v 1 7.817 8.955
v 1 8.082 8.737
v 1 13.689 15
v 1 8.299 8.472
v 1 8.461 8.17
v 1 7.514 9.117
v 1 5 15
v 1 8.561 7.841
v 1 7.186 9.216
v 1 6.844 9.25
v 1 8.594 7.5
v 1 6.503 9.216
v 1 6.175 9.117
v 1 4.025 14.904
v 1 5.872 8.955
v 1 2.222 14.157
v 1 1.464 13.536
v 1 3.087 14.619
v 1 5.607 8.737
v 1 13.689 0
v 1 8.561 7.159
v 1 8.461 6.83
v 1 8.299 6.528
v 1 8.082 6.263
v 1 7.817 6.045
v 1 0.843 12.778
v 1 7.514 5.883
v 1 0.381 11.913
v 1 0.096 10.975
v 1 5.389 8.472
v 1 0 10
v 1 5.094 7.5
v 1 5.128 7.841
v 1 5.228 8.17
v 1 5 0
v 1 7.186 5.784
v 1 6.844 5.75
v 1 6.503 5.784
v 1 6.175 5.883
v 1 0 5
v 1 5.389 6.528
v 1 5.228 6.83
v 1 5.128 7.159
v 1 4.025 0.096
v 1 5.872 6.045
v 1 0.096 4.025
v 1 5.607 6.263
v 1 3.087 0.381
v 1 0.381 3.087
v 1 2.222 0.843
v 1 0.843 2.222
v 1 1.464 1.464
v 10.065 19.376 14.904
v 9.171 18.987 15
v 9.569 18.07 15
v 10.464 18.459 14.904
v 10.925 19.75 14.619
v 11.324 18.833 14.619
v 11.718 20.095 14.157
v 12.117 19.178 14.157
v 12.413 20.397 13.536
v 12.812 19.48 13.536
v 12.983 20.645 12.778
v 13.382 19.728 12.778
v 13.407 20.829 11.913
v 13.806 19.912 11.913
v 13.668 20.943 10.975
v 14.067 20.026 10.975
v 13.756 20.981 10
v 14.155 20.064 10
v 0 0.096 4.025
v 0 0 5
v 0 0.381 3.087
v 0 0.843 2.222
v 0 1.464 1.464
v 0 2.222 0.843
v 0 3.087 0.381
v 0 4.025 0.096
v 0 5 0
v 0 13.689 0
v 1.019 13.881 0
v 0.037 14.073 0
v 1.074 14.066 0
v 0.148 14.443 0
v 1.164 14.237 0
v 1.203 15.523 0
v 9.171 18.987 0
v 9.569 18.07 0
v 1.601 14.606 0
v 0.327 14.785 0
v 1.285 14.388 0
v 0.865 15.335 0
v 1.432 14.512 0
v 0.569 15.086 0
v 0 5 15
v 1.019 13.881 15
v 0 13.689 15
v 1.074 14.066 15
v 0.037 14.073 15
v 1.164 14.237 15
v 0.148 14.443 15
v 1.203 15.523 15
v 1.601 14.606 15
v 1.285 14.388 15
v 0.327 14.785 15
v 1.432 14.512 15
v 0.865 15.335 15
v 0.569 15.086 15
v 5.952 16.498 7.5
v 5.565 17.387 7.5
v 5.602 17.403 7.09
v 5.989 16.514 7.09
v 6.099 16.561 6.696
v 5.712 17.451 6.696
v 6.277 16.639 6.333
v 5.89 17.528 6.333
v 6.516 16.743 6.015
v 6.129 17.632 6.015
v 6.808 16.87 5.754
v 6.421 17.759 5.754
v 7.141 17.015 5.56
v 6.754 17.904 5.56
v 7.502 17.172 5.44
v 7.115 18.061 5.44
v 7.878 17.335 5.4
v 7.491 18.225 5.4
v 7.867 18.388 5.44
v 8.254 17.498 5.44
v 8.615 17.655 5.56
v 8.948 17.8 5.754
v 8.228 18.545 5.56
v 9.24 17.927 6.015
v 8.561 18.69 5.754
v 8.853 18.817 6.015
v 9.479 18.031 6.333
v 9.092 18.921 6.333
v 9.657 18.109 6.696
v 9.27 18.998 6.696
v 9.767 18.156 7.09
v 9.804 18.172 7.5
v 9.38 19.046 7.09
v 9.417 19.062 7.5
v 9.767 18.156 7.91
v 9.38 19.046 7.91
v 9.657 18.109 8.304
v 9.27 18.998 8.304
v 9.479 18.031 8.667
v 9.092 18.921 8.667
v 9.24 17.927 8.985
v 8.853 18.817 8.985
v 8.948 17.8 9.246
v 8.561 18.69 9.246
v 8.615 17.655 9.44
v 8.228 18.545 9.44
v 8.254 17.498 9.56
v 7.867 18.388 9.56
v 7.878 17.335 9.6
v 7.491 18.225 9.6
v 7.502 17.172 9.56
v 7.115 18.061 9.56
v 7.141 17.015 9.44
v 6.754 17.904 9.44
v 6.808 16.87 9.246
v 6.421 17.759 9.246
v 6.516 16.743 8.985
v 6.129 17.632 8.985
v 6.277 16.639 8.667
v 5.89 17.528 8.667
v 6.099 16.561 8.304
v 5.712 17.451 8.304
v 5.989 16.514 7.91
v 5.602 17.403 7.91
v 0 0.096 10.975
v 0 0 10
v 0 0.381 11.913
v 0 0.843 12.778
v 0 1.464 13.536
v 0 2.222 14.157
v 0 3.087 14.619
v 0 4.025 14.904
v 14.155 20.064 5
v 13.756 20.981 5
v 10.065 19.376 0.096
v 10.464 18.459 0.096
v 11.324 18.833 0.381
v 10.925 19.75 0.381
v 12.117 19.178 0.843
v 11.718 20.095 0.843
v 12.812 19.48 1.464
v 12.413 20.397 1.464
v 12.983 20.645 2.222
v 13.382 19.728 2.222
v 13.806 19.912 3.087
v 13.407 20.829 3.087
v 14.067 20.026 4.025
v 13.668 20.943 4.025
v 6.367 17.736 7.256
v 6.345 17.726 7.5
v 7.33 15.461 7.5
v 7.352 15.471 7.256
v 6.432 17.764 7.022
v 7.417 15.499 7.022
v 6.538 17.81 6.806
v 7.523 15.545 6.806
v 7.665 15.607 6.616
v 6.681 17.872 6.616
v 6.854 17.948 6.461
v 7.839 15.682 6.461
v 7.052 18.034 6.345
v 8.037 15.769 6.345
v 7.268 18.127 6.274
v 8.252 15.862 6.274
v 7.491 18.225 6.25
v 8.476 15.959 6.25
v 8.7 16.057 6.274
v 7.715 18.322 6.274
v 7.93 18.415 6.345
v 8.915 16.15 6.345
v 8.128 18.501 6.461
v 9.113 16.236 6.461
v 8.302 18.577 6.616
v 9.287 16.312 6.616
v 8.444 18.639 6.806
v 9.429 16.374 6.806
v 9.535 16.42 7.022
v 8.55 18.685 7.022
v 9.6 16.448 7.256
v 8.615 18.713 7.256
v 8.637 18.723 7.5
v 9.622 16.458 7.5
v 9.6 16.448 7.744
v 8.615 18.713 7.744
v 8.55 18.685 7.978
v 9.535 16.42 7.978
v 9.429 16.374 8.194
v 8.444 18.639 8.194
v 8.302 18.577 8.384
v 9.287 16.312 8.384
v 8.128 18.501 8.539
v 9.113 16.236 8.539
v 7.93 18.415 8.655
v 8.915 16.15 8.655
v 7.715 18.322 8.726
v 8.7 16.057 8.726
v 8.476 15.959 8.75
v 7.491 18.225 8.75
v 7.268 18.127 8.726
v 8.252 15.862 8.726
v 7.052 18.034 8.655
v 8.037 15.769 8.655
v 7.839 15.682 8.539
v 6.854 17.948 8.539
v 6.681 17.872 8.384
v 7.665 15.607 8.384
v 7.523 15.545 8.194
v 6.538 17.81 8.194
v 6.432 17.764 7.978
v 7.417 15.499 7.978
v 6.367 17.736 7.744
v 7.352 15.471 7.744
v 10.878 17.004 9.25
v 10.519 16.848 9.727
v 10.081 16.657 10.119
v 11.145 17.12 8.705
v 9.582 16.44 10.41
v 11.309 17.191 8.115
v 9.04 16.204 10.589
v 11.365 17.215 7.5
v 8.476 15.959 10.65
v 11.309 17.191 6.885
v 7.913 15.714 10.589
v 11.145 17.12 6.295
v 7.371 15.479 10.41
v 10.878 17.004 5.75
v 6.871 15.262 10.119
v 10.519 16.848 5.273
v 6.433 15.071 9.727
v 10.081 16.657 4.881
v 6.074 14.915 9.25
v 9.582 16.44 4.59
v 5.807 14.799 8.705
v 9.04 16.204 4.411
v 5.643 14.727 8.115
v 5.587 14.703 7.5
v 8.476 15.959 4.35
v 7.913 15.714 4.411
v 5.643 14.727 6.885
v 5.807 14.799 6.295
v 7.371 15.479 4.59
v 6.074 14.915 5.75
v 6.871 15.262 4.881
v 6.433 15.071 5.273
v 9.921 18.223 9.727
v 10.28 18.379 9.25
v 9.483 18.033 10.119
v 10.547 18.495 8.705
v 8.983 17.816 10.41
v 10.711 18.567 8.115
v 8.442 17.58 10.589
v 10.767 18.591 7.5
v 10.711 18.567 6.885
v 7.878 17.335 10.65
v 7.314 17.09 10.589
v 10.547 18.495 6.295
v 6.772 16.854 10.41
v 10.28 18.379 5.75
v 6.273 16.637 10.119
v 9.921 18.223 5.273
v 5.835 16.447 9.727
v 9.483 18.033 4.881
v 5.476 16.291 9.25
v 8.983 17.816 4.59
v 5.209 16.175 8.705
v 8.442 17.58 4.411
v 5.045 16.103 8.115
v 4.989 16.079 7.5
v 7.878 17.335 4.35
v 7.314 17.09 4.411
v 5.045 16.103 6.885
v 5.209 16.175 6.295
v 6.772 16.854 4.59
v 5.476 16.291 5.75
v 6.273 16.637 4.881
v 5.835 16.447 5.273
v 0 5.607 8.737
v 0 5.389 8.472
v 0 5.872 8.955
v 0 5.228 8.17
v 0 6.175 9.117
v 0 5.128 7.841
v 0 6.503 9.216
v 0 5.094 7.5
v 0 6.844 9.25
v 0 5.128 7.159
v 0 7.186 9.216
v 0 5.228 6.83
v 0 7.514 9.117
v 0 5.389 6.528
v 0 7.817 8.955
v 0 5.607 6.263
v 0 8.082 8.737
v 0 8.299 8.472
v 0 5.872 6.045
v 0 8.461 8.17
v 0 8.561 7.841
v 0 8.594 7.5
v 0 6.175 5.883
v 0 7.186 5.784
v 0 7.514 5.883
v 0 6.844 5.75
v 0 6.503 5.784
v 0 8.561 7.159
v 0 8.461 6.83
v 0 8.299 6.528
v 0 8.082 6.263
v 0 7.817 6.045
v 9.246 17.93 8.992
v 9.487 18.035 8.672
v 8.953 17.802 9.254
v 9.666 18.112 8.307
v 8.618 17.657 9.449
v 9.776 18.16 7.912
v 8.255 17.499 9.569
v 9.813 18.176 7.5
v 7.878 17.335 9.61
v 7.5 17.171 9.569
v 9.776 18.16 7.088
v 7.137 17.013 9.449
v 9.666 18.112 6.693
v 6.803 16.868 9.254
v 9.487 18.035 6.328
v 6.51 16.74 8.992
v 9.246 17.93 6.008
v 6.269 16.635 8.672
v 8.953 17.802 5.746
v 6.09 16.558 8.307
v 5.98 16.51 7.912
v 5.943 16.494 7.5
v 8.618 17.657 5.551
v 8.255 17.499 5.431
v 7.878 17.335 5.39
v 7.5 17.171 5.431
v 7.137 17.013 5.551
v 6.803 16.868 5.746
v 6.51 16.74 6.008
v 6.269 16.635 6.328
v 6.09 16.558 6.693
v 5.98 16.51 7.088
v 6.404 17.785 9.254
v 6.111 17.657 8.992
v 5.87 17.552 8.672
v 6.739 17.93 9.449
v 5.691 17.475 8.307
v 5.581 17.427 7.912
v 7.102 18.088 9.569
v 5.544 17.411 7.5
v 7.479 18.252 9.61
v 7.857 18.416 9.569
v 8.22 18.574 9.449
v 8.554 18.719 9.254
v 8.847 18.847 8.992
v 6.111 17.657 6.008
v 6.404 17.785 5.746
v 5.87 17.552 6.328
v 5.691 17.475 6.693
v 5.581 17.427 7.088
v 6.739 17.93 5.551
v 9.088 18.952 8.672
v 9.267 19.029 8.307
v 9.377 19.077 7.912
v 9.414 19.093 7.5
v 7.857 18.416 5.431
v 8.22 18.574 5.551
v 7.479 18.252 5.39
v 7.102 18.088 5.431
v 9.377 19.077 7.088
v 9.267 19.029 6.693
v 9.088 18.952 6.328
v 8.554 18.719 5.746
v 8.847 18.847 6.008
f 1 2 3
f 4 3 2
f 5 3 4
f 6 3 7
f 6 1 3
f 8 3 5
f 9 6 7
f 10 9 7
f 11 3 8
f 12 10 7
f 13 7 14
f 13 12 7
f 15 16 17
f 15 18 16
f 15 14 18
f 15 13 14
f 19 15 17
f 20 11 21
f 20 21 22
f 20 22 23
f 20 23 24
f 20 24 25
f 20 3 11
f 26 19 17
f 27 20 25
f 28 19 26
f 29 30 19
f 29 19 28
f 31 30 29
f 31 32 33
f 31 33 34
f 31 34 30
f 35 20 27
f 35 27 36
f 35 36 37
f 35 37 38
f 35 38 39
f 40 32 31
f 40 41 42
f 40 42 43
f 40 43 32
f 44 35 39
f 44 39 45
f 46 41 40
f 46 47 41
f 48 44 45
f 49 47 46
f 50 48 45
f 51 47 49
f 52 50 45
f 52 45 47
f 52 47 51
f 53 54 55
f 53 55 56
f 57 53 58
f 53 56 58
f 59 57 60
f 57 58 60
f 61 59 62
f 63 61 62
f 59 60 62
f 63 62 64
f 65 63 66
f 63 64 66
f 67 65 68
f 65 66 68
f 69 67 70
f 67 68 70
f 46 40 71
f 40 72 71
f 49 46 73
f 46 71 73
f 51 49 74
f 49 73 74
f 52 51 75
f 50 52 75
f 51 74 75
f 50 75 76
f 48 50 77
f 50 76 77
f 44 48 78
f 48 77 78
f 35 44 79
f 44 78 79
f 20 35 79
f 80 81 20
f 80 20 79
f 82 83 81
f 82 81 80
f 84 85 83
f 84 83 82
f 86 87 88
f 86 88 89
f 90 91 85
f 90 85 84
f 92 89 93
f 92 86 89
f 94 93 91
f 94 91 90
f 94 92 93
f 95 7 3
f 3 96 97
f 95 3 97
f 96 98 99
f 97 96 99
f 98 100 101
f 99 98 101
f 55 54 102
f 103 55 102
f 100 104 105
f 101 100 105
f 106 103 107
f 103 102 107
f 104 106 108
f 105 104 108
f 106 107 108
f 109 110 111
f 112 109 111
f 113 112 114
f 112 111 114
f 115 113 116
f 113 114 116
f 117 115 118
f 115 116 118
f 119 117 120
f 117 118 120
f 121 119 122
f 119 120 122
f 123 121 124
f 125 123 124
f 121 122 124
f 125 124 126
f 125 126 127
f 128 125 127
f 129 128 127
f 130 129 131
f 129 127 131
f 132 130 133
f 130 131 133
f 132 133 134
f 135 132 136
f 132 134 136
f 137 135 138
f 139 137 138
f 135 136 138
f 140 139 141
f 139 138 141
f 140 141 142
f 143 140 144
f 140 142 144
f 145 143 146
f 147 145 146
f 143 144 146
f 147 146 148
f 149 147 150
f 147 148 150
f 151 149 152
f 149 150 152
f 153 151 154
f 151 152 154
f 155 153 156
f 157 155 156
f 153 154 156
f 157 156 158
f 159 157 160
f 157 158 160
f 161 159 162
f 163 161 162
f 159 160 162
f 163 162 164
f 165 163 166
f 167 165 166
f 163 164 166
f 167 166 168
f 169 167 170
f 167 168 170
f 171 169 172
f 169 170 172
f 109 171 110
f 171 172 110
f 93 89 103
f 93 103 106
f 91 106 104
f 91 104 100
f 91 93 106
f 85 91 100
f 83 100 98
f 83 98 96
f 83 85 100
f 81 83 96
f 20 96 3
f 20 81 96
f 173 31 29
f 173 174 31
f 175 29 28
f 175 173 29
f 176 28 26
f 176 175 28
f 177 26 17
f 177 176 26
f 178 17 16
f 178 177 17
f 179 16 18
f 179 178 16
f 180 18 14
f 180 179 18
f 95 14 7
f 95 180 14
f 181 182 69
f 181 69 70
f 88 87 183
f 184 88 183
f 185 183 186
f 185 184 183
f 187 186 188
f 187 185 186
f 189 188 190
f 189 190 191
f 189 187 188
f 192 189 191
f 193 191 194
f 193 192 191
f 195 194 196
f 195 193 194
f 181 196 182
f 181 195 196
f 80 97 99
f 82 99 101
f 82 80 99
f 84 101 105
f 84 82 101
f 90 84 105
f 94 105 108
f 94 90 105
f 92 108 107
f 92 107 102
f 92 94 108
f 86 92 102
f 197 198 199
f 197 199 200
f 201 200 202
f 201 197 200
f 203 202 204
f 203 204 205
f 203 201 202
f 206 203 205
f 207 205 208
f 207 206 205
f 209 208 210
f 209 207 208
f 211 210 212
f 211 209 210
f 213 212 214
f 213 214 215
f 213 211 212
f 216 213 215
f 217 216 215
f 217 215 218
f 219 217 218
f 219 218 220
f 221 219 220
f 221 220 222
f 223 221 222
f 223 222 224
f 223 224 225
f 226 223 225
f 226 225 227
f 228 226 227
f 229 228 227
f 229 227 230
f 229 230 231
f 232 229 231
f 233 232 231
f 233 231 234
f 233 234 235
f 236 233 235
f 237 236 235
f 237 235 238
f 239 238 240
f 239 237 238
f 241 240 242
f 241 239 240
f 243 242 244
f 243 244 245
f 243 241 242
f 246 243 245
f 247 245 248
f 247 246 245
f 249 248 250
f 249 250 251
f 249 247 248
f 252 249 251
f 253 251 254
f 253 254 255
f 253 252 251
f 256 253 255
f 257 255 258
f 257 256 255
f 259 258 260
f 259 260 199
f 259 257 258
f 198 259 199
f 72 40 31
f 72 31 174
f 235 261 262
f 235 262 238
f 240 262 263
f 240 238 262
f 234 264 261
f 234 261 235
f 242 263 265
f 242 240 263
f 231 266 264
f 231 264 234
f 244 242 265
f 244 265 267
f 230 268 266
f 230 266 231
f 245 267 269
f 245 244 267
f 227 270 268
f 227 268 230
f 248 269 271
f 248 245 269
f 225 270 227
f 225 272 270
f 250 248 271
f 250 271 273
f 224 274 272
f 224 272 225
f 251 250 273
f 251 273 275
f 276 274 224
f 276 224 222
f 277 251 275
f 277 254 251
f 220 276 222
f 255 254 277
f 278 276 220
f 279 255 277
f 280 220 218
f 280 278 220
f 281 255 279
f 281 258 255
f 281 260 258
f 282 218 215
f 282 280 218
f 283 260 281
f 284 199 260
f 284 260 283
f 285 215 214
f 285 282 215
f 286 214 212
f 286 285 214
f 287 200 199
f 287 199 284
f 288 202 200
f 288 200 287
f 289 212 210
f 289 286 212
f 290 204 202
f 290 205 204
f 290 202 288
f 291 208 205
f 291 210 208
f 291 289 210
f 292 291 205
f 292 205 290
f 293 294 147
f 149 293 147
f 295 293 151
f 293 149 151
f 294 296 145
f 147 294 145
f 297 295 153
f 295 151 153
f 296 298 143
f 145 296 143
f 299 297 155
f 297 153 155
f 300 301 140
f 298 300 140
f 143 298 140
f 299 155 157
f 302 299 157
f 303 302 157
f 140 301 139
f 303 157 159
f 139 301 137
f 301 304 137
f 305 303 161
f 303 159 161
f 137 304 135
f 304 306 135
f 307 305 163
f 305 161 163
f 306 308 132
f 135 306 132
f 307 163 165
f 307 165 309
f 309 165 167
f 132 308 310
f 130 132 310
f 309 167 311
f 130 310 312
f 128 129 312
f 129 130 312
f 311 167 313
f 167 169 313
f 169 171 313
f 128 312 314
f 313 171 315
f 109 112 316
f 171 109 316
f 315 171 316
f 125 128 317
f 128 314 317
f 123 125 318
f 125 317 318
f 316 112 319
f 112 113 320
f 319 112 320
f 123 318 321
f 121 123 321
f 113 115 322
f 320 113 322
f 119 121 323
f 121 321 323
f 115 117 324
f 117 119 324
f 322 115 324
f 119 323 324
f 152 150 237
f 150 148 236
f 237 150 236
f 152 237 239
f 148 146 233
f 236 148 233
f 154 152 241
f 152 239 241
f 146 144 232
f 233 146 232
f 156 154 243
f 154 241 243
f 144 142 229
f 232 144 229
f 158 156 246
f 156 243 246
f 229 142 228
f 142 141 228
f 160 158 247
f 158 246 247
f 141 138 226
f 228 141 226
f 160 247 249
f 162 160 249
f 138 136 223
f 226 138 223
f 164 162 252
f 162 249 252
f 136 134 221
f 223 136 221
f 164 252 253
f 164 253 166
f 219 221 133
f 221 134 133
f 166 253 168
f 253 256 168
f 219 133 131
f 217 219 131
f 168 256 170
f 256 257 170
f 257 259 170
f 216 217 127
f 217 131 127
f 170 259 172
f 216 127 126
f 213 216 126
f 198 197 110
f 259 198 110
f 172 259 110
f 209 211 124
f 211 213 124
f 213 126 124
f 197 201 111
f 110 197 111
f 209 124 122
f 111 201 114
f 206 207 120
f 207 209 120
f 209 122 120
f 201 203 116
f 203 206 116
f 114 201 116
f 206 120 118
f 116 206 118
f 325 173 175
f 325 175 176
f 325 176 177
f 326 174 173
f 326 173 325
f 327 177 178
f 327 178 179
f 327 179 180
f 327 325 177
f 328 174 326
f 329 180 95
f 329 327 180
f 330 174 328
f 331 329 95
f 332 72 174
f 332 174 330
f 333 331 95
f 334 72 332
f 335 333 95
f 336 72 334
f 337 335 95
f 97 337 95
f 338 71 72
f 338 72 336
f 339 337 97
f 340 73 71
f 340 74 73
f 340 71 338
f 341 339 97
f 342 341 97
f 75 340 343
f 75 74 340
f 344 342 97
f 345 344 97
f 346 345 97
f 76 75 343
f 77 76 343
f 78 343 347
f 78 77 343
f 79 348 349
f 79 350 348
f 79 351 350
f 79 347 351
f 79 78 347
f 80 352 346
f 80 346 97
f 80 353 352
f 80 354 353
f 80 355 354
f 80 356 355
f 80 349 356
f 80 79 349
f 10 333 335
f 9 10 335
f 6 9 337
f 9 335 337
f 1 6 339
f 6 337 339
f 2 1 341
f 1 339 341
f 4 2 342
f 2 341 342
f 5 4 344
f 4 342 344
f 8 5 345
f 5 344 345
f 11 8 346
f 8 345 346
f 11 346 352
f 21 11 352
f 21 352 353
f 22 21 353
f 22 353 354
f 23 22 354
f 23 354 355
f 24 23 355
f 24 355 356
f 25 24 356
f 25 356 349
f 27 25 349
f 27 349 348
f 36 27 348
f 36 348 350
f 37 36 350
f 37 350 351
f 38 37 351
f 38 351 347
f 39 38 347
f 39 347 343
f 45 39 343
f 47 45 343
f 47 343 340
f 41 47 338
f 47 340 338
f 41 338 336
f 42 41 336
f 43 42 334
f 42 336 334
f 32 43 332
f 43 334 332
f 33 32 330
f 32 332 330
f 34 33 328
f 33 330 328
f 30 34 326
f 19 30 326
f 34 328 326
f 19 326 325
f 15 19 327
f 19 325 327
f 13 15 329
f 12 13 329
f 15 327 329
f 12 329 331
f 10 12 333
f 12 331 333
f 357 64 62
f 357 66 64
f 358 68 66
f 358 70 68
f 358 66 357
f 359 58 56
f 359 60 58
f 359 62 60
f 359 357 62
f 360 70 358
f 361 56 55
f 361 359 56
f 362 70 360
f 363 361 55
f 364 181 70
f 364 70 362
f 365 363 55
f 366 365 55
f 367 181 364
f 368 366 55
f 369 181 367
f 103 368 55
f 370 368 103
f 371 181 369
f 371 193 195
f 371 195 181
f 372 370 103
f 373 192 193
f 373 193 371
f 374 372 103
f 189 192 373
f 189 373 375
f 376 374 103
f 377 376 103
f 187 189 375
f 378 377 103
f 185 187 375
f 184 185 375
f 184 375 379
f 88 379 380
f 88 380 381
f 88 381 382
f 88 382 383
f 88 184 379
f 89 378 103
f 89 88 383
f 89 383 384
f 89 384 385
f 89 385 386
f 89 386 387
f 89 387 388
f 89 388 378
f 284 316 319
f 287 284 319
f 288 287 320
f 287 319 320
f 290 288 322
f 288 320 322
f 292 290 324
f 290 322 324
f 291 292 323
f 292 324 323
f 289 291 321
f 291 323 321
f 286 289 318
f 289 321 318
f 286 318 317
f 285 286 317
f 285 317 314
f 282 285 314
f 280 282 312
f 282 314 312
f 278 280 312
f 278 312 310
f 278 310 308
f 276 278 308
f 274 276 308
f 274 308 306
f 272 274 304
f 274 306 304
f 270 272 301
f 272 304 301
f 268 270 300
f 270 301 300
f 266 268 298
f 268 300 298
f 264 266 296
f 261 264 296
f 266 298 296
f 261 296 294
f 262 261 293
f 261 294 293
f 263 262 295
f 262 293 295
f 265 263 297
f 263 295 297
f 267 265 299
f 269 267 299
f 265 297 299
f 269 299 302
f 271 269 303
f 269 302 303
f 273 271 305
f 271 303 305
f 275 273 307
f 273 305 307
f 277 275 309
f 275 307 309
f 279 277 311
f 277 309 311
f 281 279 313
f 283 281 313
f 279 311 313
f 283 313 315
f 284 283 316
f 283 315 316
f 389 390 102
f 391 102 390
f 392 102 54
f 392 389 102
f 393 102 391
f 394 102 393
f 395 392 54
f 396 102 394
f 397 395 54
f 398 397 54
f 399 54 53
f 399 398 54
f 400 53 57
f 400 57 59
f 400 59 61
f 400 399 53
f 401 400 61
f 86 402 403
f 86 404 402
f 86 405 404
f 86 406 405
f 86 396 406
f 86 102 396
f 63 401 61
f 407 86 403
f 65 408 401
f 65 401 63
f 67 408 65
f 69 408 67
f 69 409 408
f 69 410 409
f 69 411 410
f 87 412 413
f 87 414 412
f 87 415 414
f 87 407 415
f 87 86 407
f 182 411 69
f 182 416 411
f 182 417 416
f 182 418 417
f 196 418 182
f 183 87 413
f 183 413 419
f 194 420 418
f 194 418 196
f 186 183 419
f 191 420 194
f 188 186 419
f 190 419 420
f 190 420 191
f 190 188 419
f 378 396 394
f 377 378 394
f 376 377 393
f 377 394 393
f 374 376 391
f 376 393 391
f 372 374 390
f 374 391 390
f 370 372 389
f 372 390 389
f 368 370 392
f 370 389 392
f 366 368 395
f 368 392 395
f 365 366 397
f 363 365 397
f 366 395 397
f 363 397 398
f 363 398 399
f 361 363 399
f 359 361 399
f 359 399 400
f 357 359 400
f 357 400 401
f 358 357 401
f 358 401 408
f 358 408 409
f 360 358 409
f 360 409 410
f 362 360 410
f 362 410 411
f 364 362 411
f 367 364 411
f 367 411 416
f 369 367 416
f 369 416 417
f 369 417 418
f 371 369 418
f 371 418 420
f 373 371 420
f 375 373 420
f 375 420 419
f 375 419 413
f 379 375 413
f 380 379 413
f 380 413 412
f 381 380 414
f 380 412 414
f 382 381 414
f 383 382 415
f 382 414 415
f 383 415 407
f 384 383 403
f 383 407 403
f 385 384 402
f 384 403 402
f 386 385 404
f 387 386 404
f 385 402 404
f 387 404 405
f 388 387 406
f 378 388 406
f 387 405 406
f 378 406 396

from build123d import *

# Parameters (mm, degrees)
BRIDA_BASE1_DEPTH          = 15
CORTAR_EXTRUIR1_REACH      = 29.746
CROQUIS2_R                 = 2.11
CORTAR_EXTRUIR2_REACH      = 31.421
CROQUIS3_R                 = 1.75
REDONDEO1_R                = 5
S_M3_1_START               = 12.855392961
S_M3_1_OUTLINE_R           = 3.15
S_M3_1_OUTLINE_R_2         = 1.25
S_M3_1_DEPTH               = 1.5
S_M3_1_START_2             = 11.885392961
S_M3_1_2_OUTLINE_R         = 2.1
S_M3_1_2_OUTLINE_R_2       = 1.25
S_M3_1_2_DEPTH             = 0.97
S_LIDO_MOVER_COPIAR2_ANGLE = 156.5


with BuildPart() as part:
    # Brida base1: sheet metal written as solids
    # Croquis1 → Brida base1 (new body)
    with BuildSketch(Plane.XY):
        with BuildLine():
            Line((0, 0), (0, 13.688742542))
            ThreePointArc((0, 13.688742542), (0.327427688, 14.785329001), (1.202501862, 15.522862691))
            Line((1.202501862, 15.522862691), (13.755901116, 20.981236034))
            Line((13.755901116, 20.981236034), (14.154650185, 20.064175959))
            Line((14.154650185, 20.064175959), (1.601250931, 14.605802616))
            ThreePointArc((1.601250931, 14.605802616), (1.163713844, 14.237035771), (1, 13.688742542))
            Line((1, 13.688742542), (1, 0))
            Line((1, 0), (0, 0))
        make_face()
    extrude(amount=BRIDA_BASE1_DEPTH)

    # Croquis2 → Cortar-Extruir1 (cut, up to next)
    with BuildSketch(Plane(origin=(-5.485152762, 12.6149877, 0), x_dir=(0.917060074385125, 0.3987490689252439, 0), z_dir=(-0.3987490689252439, 0.917060074385125, 0)), mode=Mode.PRIVATE) as cortar_extruir1_sk1:
        with Locations(Location((14.136864763, -7.5, 0), (0, 0, 180))):
            Circle(CROQUIS2_R)
    cortar_extruir1_tool1 = extrude(cortar_extruir1_sk1.sketch, amount=-CORTAR_EXTRUIR1_REACH, mode=Mode.PRIVATE) & part.part
    add(cortar_extruir1_tool1.solids().sort_by_distance((7.479201, 18.252049, 7.5))[0], mode=Mode.SUBTRACT)

    # Croquis3 → Cortar-Extruir2 (cut, up to next)
    with BuildSketch(Plane.ZY, mode=Mode.PRIVATE) as cortar_extruir2_sk1:
        with Locations((7.5, 6.844371271)):
            Circle(CROQUIS3_R)
    cortar_extruir2_tool1 = extrude(cortar_extruir2_sk1.sketch, amount=-CORTAR_EXTRUIR2_REACH, mode=Mode.PRIVATE) & part.part
    add(cortar_extruir2_tool1.solids().sort_by_distance((0, 6.844371, 7.5))[0], mode=Mode.SUBTRACT)

    # Redondeo1
    redondeo1_edges = [part.edges().sort_by_distance(p)[0] for p in [
        (0.5, 0, 15),
        (13.95527565, 20.522705997, 15),
        (0.5, 0, 0),
        (13.95527565, 20.522705997, 0),
    ]]
    fillet(redondeo1_edges, radius=REDONDEO1_R)


with BuildPart() as body_2:
    # S-M3-1: read off the stored shape, not the designer's step
    # S-M3-1 outline → S-M3-1 (new body)
    with BuildSketch(Plane(origin=(0, 0, 0), x_dir=(1, 0, 0), z_dir=(0, 1, 0)).offset(S_M3_1_START)):
        with Locations((7.761578354, 3.940203324)):
            Circle(S_M3_1_OUTLINE_R)
        with Locations((7.761578354, 3.940203324)):
            Circle(S_M3_1_OUTLINE_R_2, mode=Mode.SUBTRACT)
    extrude(amount=S_M3_1_DEPTH)

    # S-M3-1 2 outline → S-M3-1 2 (add)
    with BuildSketch(Plane(origin=(0, 0, 0), x_dir=(1, 0, 0), z_dir=(0, 1, 0)).offset(S_M3_1_START_2)):
        with Locations((7.761578354, 3.940203324)):
            Circle(S_M3_1_2_OUTLINE_R)
        with Locations((7.761578354, 3.940203324)):
            Circle(S_M3_1_2_OUTLINE_R_2, mode=Mode.SUBTRACT)
    extrude(amount=S_M3_1_2_DEPTH)


with BuildPart() as body_2_1:
    # Sólido-Mover/Copiar2: read off the stored shape, not the designer's step
    # Sólido-Mover/Copiar2: moved
    add(body_2.part.moved(Location((-21.8984431, -25.6112941, 11.4402033))).rotate(Axis((0, 0, 0), (0, 0, -1)), S_LIDO_MOVER_COPIAR2_ANGLE))


solid = Compound([part.part, body_2_1.part])
